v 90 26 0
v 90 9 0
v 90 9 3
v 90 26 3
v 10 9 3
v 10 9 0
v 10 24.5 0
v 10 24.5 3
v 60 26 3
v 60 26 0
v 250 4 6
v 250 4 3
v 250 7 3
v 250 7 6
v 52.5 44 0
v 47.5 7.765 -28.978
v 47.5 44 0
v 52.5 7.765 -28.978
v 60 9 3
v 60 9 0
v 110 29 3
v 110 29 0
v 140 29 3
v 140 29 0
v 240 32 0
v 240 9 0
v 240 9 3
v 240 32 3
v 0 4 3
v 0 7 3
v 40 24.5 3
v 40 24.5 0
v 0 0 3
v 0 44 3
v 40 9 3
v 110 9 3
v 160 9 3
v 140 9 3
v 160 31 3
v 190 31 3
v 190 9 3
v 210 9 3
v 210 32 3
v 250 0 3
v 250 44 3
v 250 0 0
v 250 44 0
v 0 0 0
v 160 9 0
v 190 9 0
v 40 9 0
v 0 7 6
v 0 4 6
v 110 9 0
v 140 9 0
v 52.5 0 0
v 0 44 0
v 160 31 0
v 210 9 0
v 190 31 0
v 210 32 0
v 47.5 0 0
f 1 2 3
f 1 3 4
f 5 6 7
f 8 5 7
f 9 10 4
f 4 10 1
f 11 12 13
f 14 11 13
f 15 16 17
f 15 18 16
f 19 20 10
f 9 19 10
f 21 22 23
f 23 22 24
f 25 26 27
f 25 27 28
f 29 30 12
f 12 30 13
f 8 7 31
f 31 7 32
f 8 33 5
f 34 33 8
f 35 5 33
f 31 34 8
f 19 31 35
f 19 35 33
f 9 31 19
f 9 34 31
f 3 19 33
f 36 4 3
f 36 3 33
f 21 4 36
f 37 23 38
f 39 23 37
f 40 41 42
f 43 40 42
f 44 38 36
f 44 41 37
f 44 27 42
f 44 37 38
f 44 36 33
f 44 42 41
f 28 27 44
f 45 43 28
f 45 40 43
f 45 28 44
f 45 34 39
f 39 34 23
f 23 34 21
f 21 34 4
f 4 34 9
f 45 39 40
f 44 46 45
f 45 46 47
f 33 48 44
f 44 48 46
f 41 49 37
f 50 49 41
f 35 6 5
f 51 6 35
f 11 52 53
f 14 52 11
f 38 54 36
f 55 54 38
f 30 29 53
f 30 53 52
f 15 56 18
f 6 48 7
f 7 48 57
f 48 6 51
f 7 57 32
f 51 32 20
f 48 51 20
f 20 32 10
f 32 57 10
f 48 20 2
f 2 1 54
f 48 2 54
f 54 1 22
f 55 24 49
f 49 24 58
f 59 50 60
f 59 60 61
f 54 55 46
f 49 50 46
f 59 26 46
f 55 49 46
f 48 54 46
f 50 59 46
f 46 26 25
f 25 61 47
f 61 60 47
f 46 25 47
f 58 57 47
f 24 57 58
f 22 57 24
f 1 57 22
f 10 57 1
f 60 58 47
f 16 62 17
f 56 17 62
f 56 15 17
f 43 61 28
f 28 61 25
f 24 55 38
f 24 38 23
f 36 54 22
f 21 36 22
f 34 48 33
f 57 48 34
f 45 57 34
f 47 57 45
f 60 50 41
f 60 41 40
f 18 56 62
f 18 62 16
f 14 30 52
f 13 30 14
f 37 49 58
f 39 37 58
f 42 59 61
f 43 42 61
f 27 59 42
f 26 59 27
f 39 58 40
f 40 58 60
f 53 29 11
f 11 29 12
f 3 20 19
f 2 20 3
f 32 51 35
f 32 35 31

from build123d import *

# Parameters (mm, degrees)
F0_W     = 250
F0_H     = 44
F0_W_2   = 30
F0_H_2   = 15.5
F0_H_3   = 17
F0_H_4   = 20
F0_H_5   = 22
F0_H_6   = 23
F1_DEPTH = 3
F2_W     = 250
F2_H     = 3
F3_DEPTH = 3
F6_DEPTH = 2.5


with BuildPart() as f1:
    # F0 (on Top) → F1 (new body)
    with BuildSketch(Plane.XY):
        with Locations((125, 22)):
            Rectangle(F0_W, F0_H)
        with Locations((25, 16.75)):
            Rectangle(F0_W_2, F0_H_2, mode=Mode.SUBTRACT)
        with Locations((75, 17.5)):
            Rectangle(F0_W_2, F0_H_3, mode=Mode.SUBTRACT)
        with Locations((125, 19)):
            Rectangle(F0_W_2, F0_H_4, mode=Mode.SUBTRACT)
        with Locations((175, 20)):
            Rectangle(F0_W_2, F0_H_5, mode=Mode.SUBTRACT)
        with Locations((225, 20.5)):
            Rectangle(F0_W_2, F0_H_6, mode=Mode.SUBTRACT)
    extrude(amount=F1_DEPTH)


with BuildPart() as f3:
    # F2 (on face) → F3 (new body)
    with BuildSketch(Plane.XY.offset(3)):
        with Locations((125, 5.5)):
            Rectangle(F2_W, F2_H)
    extrude(amount=F3_DEPTH)


with BuildPart() as f6:
    # F5 (on offset) → F6 (new body, symmetric)
    with BuildSketch(Plane.YZ.offset(50)):
        Polygon((44, 0), (0, 0), (7.764571, -28.977775), align=None)
    extrude(amount=F6_DEPTH, both=True)


solid = Compound([f1.part, f3.part, f6.part])
